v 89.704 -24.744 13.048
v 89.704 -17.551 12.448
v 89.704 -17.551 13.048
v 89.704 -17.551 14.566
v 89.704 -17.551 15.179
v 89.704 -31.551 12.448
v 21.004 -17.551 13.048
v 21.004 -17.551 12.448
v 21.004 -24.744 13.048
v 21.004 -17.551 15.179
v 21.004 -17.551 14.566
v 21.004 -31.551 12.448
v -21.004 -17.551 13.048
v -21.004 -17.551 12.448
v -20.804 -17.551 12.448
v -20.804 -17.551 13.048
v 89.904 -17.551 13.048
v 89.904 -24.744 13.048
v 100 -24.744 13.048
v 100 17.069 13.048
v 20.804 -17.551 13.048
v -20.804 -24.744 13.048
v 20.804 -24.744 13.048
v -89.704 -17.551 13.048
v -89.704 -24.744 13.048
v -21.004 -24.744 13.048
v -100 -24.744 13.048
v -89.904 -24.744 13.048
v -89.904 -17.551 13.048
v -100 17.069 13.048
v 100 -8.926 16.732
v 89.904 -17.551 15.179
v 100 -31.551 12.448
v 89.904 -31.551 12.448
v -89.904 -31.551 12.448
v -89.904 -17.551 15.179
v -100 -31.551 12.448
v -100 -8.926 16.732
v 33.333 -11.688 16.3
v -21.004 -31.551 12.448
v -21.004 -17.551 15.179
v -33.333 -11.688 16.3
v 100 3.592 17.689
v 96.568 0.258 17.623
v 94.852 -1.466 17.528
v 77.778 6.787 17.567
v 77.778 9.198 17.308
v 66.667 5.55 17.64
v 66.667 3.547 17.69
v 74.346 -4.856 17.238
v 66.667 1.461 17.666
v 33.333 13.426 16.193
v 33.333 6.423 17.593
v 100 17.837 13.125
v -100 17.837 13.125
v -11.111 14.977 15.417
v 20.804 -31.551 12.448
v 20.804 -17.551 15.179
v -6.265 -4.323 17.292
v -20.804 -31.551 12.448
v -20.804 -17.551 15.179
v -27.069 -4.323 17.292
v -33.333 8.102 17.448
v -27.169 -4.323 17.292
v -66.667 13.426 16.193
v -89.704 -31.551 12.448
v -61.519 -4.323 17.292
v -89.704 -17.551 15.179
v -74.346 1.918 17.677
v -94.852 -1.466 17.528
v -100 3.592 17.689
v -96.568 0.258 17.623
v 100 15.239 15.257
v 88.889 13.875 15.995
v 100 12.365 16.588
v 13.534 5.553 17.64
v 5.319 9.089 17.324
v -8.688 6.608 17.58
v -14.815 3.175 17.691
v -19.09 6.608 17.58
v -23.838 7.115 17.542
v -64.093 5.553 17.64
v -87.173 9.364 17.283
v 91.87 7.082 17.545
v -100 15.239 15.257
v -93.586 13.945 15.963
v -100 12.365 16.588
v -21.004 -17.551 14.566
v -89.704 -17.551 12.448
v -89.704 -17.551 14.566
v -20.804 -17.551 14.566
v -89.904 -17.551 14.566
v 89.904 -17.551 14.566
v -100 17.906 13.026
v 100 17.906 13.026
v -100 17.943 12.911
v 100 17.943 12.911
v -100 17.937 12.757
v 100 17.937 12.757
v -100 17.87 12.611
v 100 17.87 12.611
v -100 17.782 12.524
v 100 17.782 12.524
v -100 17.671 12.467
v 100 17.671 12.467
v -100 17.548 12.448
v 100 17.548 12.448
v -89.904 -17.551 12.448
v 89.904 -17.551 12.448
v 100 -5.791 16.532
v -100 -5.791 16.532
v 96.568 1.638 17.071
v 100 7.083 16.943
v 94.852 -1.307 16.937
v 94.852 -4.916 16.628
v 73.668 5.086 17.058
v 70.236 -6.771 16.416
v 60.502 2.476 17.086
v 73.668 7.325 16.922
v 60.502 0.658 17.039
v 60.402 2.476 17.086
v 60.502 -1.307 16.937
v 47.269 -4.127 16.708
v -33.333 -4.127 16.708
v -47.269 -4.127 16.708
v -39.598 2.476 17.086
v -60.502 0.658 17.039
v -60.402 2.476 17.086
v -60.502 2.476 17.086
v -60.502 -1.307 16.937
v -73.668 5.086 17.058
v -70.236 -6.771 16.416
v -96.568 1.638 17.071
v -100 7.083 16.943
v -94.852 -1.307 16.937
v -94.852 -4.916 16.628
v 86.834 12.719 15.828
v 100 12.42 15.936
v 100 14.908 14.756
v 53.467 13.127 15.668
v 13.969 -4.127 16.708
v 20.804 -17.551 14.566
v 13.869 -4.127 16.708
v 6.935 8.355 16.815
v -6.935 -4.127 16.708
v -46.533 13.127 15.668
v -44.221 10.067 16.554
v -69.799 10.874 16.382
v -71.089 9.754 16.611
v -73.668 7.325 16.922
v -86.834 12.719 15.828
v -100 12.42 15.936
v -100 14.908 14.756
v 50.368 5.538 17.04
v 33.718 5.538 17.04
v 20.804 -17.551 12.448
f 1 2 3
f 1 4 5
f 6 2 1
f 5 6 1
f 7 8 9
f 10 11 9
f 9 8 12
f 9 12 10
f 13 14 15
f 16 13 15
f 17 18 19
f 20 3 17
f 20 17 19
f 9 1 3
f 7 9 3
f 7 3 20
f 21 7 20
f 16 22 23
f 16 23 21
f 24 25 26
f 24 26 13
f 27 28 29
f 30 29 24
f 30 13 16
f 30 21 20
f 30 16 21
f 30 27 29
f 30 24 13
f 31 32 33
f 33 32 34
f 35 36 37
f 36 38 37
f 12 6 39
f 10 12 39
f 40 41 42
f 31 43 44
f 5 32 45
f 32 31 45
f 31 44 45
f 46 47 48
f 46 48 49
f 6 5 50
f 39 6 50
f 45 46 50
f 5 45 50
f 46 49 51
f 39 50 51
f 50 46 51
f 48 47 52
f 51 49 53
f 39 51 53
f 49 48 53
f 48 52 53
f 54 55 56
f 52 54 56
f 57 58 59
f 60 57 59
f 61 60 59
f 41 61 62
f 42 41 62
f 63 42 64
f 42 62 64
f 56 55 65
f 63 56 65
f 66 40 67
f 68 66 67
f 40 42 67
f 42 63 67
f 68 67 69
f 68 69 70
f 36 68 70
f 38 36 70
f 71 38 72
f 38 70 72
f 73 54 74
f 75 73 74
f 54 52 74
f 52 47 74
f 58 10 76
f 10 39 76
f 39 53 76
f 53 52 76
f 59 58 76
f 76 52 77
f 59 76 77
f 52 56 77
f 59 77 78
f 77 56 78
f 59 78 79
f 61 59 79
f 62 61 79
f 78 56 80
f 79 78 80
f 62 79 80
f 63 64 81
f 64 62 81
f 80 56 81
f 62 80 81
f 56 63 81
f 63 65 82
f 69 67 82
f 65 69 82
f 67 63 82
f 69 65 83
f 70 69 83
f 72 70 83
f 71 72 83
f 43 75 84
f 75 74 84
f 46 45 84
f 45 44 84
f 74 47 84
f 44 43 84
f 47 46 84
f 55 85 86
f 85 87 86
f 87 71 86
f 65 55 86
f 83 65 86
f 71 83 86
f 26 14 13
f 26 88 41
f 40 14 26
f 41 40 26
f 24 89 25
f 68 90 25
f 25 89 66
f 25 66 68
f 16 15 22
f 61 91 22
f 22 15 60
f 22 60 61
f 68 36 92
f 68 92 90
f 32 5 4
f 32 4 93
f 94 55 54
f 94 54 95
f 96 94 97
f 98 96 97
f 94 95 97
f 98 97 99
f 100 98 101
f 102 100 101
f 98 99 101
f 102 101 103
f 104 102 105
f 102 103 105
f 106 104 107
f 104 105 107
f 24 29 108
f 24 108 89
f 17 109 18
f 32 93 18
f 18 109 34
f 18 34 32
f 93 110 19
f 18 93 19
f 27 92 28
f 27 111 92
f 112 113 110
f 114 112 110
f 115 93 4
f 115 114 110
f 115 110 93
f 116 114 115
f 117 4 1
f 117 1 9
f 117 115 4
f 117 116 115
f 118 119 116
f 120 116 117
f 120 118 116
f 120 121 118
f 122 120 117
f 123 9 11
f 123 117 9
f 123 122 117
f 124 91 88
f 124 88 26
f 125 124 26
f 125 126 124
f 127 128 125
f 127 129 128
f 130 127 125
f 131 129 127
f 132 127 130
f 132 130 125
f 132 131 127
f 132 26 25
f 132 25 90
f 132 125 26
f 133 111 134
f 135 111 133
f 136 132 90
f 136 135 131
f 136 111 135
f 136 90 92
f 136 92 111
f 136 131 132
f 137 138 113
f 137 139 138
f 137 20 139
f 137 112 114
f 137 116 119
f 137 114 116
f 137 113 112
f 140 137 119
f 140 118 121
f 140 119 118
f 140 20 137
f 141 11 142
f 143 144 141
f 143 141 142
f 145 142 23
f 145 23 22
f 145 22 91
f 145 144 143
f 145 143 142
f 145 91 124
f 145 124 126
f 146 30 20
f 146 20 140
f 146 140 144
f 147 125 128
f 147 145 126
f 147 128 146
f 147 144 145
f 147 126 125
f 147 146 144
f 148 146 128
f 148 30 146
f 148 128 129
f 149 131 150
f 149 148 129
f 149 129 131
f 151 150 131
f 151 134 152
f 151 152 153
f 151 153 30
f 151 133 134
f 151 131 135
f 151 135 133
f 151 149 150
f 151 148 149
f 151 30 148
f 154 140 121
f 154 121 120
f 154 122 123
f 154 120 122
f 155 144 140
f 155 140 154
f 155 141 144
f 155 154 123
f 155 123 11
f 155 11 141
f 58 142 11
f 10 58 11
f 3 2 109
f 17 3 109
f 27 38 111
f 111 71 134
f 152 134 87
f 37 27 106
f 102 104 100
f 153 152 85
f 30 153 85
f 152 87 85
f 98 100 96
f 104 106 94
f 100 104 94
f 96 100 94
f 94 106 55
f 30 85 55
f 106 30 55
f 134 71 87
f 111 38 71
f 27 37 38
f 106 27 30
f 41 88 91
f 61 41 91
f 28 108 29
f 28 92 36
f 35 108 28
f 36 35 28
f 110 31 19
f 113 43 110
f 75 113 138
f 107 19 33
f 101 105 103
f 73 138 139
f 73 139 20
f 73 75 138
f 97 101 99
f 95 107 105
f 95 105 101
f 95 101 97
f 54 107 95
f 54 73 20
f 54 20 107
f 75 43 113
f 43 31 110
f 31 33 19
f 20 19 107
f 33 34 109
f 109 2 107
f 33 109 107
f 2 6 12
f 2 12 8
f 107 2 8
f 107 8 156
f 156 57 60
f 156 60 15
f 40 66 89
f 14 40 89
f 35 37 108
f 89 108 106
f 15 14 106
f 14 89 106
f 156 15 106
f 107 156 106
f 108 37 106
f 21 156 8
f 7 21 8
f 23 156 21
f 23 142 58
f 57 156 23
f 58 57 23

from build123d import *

# Parameters (mm, degrees)
F1_DEPTH = 200
F4_T     = -0.6
F3_W     = 0.2
F3_H     = 14
F5_DEPTH = 25
F6_W     = 0.2
F6_H     = 14
F7_DEPTH = 25
F8_R     = 0.4


with BuildPart() as f1:
    # F0 (on Right) → F1 (new body)
    with BuildSketch(Plane.YZ):
        with BuildLine():
            add(Edge.make_bspline(
                [(18.4494327754, -3.8520128001), (15.5609515421, -0.4847487874), (8.1340167717, 2.2164674432), (-12.2966120419, 0.5504568669), (-24.9624218007, -2.9072897866), (-31.5505672246, -3.8520128001)],
                knots=[0, 0, 0, 0, 0.2747109337, 0.6355042516, 1, 1, 1, 1], degree=3))
            Line((-31.5505672246, -3.8520128001), (18.4494327754, -3.8520128001))
        make_face()
    extrude(amount=F1_DEPTH)


with BuildPart() as f1_1:
    # F2: moved
    add(f1.part.moved(Location((-100, 0, 16.3))))

    # F4
    f4_openings = [f1_1.faces().sort_by_distance(p)[0] for p in [
        (100, -2.298769, 14.541602),
        (-100, -2.298769, 14.541602),
    ]]
    offset(amount=F4_T, openings=f4_openings)

    # F3 (on face) → F5 (cut)
    with BuildSketch(Plane(origin=(0, 0, 12.4479871999), x_dir=(1, 0, 0), z_dir=(0, 0, -1))):
        with Locations((89.8042006254, 24.5505672246)):
            Rectangle(F3_W, F3_H)
        with Locations((-89.8042006254, 24.5505672246)):
            Rectangle(F3_W, F3_H)
    extrude(amount=-F5_DEPTH, mode=Mode.SUBTRACT)

    # F6 (on face) → F7 (cut)
    with BuildSketch(Plane(origin=(0, 0, 12.4479871999), x_dir=(1, 0, 0), z_dir=(0, 0, -1))):
        with Locations((-20.9039503872, 24.5505672246)):
            Rectangle(F6_W, F6_H)
        with Locations((20.9039503872, 24.5505672246)):
            Rectangle(F6_W, F6_H)
    extrude(amount=-F7_DEPTH, mode=Mode.SUBTRACT)

    # F8
    f8_edges = [f1_1.edges().sort_by_distance(p)[0] for p in [
        (0, 18.449433, 12.447987),
    ]]
    fillet(f8_edges, radius=F8_R)


solid = f1_1.part
